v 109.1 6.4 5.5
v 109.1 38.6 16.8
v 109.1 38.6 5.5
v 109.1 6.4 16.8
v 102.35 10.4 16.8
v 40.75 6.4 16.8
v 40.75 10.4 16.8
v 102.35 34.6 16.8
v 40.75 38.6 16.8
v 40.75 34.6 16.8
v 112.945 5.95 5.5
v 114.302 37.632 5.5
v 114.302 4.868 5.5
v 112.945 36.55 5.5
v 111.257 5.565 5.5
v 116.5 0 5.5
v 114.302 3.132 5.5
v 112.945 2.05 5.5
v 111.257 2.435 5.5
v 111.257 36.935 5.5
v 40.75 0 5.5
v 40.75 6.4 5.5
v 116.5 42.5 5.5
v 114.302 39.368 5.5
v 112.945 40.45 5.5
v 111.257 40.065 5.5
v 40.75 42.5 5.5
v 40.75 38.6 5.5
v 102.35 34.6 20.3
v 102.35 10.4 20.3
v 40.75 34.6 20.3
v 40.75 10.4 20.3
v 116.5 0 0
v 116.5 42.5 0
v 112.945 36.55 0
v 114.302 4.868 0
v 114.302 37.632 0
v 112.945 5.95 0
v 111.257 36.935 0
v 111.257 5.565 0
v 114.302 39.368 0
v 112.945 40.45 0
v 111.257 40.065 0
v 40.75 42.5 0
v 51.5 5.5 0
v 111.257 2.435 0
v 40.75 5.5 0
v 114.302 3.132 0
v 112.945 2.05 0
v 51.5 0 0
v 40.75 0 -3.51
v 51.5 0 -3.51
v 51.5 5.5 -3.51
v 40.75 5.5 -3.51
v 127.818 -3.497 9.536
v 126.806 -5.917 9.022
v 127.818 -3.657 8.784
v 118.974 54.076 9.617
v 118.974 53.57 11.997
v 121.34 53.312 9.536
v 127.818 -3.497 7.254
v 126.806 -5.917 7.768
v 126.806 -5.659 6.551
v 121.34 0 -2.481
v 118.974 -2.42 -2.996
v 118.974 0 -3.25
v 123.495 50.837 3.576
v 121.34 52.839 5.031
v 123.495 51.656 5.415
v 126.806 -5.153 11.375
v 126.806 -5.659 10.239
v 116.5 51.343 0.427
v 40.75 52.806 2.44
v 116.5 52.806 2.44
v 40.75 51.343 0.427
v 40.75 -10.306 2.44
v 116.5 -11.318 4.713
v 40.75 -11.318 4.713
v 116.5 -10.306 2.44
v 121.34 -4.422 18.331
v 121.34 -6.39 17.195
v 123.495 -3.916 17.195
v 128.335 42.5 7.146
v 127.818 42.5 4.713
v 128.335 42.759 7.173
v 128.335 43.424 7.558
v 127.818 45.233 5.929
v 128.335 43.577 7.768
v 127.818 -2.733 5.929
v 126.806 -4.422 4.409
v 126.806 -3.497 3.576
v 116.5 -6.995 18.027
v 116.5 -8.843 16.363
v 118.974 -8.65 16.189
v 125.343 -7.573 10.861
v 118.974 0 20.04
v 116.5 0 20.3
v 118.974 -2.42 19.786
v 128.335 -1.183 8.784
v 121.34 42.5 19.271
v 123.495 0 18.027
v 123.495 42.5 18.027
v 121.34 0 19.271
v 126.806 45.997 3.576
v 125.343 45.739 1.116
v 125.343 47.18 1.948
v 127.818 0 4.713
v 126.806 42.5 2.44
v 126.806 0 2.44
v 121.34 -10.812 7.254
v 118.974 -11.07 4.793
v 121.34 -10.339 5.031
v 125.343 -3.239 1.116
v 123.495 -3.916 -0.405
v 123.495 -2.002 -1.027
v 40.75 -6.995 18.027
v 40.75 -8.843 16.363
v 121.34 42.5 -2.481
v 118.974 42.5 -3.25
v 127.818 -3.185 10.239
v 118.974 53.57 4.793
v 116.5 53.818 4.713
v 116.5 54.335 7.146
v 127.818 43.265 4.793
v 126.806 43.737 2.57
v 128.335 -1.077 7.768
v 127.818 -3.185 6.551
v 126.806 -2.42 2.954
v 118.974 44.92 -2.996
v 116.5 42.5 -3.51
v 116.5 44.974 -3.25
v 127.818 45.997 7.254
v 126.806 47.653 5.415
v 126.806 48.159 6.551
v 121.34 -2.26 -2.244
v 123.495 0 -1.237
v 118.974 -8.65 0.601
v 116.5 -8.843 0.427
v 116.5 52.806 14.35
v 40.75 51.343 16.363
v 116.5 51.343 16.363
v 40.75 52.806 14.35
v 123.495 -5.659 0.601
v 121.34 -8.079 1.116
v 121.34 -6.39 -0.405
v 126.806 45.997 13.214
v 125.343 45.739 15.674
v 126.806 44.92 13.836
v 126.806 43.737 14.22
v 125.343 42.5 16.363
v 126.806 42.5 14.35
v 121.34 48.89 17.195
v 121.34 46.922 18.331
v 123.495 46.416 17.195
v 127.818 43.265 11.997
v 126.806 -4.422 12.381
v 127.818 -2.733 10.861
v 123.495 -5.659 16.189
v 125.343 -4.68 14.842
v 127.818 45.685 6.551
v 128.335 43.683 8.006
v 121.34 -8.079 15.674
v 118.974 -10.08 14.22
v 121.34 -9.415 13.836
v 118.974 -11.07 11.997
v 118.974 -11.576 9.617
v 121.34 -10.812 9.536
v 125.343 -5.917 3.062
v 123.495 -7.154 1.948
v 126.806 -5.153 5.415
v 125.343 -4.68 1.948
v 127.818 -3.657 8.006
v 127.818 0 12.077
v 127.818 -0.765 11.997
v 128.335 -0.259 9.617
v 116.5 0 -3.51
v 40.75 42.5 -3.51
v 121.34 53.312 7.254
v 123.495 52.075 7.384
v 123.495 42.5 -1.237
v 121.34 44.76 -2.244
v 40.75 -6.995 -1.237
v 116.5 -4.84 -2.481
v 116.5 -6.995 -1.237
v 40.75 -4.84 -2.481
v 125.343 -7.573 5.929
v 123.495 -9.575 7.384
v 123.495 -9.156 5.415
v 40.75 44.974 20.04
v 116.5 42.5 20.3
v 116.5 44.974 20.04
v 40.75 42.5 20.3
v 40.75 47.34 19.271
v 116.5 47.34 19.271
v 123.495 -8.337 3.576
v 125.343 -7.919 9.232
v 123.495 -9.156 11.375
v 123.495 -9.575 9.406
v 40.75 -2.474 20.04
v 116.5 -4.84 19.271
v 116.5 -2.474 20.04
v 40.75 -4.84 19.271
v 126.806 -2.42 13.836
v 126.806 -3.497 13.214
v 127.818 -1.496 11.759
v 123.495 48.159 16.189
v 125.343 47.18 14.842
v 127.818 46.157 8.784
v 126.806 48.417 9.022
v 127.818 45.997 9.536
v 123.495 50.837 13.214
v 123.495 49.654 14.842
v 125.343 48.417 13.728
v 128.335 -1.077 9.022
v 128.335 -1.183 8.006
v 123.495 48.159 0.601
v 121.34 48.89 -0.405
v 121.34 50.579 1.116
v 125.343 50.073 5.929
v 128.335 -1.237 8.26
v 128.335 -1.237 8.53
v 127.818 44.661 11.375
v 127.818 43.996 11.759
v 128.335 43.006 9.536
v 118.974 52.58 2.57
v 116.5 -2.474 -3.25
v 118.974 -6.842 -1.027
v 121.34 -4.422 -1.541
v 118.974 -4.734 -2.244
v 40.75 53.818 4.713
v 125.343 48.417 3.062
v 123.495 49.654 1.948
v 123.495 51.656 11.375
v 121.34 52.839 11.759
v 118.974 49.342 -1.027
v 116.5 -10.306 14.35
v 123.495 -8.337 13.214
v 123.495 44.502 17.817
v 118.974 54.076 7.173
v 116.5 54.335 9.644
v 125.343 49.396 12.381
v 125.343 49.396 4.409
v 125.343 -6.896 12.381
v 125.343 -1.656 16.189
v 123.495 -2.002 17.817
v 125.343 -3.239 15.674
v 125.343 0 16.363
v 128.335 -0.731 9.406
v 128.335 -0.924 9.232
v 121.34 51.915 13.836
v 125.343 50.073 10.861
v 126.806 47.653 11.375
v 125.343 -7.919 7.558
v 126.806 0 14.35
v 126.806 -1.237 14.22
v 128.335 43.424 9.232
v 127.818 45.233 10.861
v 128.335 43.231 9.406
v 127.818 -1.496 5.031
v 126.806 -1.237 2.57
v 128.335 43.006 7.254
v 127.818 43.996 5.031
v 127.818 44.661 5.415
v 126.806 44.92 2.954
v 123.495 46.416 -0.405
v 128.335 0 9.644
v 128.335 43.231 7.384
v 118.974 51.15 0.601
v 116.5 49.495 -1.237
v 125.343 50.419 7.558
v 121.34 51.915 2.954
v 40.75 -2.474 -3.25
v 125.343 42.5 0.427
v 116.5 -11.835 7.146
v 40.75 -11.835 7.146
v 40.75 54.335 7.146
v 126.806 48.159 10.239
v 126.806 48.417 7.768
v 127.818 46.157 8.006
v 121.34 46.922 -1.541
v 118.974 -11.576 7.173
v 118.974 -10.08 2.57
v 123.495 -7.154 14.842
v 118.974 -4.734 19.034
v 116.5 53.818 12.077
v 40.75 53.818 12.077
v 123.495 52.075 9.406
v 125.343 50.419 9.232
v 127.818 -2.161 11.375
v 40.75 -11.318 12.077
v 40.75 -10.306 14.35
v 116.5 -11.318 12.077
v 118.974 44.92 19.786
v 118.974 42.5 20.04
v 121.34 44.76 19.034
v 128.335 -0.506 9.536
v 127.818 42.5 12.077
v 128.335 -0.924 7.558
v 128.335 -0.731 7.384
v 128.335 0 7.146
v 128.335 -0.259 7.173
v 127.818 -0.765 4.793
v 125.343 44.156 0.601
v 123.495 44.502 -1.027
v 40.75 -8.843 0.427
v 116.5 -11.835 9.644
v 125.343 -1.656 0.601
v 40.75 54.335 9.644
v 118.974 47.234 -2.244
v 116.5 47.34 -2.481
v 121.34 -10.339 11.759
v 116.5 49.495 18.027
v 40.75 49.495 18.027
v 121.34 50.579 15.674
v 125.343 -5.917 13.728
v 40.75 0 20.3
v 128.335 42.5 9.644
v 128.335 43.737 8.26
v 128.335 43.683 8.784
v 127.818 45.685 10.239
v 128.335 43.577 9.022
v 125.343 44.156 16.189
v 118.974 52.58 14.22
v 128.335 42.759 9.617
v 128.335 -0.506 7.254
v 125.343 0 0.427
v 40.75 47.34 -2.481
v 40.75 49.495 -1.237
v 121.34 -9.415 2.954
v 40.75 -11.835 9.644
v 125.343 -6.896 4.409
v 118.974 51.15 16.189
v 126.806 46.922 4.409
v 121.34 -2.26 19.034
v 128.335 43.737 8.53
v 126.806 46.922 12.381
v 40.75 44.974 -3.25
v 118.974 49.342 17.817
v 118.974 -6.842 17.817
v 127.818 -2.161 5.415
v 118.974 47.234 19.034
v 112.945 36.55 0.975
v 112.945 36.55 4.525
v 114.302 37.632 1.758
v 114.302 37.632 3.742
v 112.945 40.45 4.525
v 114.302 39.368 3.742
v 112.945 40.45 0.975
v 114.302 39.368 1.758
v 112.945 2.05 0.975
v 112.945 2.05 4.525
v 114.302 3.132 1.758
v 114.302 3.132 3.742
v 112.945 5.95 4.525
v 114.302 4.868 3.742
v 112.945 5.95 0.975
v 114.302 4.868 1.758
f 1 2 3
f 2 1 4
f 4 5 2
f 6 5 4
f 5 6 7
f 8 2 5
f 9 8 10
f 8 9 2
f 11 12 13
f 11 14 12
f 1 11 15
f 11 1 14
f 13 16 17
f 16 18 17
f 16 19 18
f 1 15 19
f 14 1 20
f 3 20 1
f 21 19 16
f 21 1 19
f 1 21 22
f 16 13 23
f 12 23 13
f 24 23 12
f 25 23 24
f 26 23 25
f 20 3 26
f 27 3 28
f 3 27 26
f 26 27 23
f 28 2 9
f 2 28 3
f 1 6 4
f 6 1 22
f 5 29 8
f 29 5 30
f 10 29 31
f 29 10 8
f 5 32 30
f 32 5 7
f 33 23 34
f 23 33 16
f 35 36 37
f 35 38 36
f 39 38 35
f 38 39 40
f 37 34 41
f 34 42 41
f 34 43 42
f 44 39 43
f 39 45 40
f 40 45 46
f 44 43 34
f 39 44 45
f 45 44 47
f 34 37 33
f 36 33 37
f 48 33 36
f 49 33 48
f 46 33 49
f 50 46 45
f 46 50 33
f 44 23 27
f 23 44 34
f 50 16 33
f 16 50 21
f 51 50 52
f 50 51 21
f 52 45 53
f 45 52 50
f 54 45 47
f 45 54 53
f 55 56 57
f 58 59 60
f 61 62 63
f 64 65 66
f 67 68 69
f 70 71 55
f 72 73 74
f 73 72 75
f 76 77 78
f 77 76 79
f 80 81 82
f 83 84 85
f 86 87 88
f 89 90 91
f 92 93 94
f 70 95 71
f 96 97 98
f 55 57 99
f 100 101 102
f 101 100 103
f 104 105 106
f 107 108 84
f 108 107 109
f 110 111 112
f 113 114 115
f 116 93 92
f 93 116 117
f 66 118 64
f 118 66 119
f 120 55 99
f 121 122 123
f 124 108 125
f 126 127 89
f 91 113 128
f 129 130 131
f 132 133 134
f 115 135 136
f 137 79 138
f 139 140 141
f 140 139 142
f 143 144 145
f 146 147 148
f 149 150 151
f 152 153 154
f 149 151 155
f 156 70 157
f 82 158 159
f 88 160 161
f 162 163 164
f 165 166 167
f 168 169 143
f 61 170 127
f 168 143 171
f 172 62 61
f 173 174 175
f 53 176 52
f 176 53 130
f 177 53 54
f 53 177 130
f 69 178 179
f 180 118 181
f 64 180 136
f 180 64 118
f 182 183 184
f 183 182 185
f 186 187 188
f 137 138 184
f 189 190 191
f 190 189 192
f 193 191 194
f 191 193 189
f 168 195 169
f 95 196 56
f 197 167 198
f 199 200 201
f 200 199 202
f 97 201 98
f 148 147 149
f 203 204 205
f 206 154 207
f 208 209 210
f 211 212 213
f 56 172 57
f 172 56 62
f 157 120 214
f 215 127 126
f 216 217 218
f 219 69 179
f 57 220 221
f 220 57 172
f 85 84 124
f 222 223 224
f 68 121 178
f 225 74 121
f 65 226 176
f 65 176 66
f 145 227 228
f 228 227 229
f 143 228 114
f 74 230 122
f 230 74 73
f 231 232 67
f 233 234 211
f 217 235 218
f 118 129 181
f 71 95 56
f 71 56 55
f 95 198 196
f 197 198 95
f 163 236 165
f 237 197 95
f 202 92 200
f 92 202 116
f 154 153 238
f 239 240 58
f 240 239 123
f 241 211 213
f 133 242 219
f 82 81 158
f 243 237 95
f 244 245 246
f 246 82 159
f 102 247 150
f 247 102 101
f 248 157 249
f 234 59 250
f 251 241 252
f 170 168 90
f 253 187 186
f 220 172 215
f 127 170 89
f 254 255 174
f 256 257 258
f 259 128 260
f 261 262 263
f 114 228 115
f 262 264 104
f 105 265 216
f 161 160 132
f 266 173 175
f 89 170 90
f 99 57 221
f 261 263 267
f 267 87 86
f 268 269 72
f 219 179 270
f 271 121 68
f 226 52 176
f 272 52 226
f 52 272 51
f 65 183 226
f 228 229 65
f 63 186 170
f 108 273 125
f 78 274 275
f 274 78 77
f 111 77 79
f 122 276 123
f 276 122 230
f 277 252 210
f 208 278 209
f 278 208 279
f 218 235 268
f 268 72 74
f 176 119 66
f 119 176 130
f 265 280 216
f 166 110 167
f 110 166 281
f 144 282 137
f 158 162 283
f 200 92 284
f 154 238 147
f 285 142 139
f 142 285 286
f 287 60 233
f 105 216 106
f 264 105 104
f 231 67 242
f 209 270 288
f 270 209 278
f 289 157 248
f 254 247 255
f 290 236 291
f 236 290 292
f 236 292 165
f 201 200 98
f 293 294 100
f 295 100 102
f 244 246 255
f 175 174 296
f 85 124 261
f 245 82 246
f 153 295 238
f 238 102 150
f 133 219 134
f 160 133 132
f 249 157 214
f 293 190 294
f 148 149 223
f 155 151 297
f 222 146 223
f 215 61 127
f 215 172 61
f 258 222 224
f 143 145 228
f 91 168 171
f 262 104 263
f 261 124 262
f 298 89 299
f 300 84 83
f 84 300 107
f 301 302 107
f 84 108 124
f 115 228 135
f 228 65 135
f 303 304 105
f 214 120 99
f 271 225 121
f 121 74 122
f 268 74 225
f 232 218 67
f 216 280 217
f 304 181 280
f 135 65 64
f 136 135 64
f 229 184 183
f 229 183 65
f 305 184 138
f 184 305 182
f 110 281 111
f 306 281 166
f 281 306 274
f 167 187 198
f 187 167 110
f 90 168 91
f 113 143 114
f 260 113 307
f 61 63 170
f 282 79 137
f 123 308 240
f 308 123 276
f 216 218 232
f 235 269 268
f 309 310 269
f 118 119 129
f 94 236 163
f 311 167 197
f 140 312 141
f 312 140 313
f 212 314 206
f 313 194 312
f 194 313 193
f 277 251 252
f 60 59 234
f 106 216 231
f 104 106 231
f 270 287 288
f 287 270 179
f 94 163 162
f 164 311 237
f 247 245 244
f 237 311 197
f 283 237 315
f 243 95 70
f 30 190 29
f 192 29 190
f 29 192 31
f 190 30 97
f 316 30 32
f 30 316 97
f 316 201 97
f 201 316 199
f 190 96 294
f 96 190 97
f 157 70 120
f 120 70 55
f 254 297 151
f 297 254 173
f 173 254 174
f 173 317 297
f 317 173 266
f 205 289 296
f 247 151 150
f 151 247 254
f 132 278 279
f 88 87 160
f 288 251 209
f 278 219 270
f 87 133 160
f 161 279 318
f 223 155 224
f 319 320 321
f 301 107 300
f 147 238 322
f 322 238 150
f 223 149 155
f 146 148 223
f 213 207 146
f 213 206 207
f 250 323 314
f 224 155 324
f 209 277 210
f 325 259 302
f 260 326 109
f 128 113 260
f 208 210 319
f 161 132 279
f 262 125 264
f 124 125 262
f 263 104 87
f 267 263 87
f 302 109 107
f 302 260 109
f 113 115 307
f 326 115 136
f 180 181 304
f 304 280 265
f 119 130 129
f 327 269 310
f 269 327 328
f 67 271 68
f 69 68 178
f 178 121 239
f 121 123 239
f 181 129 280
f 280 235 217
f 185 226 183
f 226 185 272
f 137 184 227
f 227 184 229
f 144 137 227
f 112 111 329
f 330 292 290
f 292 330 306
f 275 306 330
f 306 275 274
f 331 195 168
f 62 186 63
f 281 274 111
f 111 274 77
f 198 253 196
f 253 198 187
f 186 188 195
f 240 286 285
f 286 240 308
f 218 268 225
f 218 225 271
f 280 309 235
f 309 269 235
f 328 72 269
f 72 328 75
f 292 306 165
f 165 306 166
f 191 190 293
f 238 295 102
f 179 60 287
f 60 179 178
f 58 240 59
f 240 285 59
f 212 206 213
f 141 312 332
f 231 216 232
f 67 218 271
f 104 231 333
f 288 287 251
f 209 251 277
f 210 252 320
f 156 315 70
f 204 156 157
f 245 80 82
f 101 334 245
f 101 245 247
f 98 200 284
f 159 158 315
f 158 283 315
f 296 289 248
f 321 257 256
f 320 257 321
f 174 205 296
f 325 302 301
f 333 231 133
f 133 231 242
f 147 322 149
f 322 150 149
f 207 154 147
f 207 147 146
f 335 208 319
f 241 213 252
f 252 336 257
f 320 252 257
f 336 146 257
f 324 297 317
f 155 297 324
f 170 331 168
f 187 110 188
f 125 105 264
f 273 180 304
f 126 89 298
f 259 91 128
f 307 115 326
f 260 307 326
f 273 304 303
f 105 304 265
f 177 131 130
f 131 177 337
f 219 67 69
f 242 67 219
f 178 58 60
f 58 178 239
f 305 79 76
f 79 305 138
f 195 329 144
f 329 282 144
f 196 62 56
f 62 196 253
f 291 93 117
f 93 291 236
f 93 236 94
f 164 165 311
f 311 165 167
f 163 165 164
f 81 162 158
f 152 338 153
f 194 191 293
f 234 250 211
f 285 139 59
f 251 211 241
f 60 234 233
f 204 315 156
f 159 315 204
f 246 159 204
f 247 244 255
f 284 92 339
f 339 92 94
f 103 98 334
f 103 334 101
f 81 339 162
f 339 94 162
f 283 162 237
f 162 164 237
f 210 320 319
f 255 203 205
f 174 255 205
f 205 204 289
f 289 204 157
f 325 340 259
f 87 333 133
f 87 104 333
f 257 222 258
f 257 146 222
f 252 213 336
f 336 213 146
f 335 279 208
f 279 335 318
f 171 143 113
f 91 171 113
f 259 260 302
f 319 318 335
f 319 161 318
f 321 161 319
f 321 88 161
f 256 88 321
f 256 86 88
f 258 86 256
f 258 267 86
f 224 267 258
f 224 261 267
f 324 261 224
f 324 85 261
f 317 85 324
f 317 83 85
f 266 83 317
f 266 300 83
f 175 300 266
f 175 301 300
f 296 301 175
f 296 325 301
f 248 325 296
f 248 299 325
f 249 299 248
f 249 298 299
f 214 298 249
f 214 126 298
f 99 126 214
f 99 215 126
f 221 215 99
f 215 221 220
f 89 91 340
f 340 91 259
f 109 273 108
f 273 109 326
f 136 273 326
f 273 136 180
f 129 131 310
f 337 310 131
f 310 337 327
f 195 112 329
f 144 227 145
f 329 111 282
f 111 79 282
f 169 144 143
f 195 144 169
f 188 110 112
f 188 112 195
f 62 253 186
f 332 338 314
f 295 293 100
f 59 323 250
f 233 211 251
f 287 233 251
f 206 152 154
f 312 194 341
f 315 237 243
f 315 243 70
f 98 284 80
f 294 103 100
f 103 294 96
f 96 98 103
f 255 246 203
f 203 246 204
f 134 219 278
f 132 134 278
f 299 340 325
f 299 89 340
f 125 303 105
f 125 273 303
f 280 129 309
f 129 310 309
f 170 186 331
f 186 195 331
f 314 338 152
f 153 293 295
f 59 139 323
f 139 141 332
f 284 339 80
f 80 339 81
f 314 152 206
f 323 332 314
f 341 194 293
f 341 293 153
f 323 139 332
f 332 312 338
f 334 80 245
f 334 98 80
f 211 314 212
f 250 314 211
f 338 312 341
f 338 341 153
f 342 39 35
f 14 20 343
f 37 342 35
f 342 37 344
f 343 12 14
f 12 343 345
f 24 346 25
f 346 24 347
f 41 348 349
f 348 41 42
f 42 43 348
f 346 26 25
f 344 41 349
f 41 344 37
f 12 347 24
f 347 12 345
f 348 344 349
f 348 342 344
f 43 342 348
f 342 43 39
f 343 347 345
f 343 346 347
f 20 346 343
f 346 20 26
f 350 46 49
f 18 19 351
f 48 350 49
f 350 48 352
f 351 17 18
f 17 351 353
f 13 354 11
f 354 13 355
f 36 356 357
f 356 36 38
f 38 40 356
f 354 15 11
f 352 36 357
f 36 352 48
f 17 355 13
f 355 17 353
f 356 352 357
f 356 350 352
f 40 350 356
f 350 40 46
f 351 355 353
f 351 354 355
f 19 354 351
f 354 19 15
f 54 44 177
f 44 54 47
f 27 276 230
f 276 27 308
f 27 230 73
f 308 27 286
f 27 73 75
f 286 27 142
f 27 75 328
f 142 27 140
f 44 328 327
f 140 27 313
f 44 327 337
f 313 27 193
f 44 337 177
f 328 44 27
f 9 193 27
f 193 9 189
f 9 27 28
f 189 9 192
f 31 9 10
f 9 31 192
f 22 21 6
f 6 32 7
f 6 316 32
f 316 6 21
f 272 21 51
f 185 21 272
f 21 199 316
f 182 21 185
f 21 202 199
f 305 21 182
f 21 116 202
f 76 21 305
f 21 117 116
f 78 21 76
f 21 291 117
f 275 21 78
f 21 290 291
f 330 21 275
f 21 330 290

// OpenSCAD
pcb_x = 116.5;
pcb_y = 42.5;
pcb_z = 5.5;
pcb_bolt_d = 4;  // is marginally too small for M3 :(
pcb_bolt_r = pcb_bolt_d/2;
pcb_bolt_inset = 4;

lcd_x_offset = 6.9;
lcd_y_offset = 6.4;
lcd_view_x_offset = 6.75;
lcd_view_y_offset = 4;
lcd_view_z = 10;
lcd_x = 102.2;
lcd_y = 32.2;
lcd_z = 11.3;

pins_x_offset = 8.5;
pins_y_offset = 0;
pins_x = 43;
pins_y = 5.5;
pins_z = 20;

case_wall = 3.5;
case_d = pcb_z + lcd_z + (2 * case_wall);
case_r  = case_d/2;
case_split = pins_x_offset + (pins_x * .75);

difference()
{
	lcdcase_all();
	translate([-pcb_x*2,0,0])
	translate([case_split,-pcb_y/2,-case_r/2]) cube([pcb_x*2,pcb_y*2,case_r*4]);
}



module lcdcase_all()
{
	difference()
	{
		lcdcase();
		lcdunit();
	}
	pcb_boltholes();
}

module lcdcase()
{
	translate([0,0,case_r-case_wall])
	rotate([0,90,0])
	minkowski()
	{
		sphere(r=case_r,center=true);
		cube([0.01, pcb_y, pcb_x]);
	}
}

module lcdunit()
{
	union() 
	{
		lcd();
		pcb();
		pins();
	}
}

module pins()
{
	translate([pins_x_offset, pins_y_offset, -pins_z + 0.02])
		cube([pins_x, pins_y, pins_z]);
}

module lcd()
{
	translate([lcd_x_offset, lcd_y_offset, pcb_z])
	{
		cube([lcd_x, lcd_y, lcd_z]);
		translate([lcd_view_x_offset, lcd_view_y_offset, lcd_z - 0.02])
			cube([lcd_x - (2*lcd_view_x_offset), lcd_y - (2*lcd_view_y_offset), lcd_view_z]);
	}
}

module pcb()
{
	difference()
	{
		cube([pcb_x, pcb_y, pcb_z]);
		// pcb_boltholes();
	}
}

module pcb_boltholes()
{
	for(y = [pcb_y - pcb_bolt_inset, pcb_bolt_inset])
	{
		translate([pcb_bolt_inset,y,-0.01])
		{
			funky_holegrabber(radius = pcb_bolt_r, height = pcb_z + 0.02);
			// cylinder(r=pcb_bolt_r, h=pcb_z+0.02);
		}
	}

	for(q = [pcb_y - pcb_bolt_inset, pcb_bolt_inset])
	{
		translate([pcb_x - pcb_bolt_inset,q,-0.01])
		{
			rotate([0,0,180]) funky_holegrabber(radius = pcb_bolt_r, height = pcb_z + 0.02);
			// cylinder(r=pcb_bolt_r, h=pcb_z+0.02);
		}
	}

}

module funky_holegrabber(height = 1, radius = 5)
{
	difference()
	{
		translate([0,0,-0.01]) cylinder(r=radius, h = height+0.02);
		translate([0,0,height/2]) cube([radius * 2.001, radius * 2.01, height * .33], center = true);
		translate([radius,0,height/2]) rotate([90,180,0]) cylinder(r = height, h = (radius*2) + 0.023, center=true, $fn = 3);
	}
}
